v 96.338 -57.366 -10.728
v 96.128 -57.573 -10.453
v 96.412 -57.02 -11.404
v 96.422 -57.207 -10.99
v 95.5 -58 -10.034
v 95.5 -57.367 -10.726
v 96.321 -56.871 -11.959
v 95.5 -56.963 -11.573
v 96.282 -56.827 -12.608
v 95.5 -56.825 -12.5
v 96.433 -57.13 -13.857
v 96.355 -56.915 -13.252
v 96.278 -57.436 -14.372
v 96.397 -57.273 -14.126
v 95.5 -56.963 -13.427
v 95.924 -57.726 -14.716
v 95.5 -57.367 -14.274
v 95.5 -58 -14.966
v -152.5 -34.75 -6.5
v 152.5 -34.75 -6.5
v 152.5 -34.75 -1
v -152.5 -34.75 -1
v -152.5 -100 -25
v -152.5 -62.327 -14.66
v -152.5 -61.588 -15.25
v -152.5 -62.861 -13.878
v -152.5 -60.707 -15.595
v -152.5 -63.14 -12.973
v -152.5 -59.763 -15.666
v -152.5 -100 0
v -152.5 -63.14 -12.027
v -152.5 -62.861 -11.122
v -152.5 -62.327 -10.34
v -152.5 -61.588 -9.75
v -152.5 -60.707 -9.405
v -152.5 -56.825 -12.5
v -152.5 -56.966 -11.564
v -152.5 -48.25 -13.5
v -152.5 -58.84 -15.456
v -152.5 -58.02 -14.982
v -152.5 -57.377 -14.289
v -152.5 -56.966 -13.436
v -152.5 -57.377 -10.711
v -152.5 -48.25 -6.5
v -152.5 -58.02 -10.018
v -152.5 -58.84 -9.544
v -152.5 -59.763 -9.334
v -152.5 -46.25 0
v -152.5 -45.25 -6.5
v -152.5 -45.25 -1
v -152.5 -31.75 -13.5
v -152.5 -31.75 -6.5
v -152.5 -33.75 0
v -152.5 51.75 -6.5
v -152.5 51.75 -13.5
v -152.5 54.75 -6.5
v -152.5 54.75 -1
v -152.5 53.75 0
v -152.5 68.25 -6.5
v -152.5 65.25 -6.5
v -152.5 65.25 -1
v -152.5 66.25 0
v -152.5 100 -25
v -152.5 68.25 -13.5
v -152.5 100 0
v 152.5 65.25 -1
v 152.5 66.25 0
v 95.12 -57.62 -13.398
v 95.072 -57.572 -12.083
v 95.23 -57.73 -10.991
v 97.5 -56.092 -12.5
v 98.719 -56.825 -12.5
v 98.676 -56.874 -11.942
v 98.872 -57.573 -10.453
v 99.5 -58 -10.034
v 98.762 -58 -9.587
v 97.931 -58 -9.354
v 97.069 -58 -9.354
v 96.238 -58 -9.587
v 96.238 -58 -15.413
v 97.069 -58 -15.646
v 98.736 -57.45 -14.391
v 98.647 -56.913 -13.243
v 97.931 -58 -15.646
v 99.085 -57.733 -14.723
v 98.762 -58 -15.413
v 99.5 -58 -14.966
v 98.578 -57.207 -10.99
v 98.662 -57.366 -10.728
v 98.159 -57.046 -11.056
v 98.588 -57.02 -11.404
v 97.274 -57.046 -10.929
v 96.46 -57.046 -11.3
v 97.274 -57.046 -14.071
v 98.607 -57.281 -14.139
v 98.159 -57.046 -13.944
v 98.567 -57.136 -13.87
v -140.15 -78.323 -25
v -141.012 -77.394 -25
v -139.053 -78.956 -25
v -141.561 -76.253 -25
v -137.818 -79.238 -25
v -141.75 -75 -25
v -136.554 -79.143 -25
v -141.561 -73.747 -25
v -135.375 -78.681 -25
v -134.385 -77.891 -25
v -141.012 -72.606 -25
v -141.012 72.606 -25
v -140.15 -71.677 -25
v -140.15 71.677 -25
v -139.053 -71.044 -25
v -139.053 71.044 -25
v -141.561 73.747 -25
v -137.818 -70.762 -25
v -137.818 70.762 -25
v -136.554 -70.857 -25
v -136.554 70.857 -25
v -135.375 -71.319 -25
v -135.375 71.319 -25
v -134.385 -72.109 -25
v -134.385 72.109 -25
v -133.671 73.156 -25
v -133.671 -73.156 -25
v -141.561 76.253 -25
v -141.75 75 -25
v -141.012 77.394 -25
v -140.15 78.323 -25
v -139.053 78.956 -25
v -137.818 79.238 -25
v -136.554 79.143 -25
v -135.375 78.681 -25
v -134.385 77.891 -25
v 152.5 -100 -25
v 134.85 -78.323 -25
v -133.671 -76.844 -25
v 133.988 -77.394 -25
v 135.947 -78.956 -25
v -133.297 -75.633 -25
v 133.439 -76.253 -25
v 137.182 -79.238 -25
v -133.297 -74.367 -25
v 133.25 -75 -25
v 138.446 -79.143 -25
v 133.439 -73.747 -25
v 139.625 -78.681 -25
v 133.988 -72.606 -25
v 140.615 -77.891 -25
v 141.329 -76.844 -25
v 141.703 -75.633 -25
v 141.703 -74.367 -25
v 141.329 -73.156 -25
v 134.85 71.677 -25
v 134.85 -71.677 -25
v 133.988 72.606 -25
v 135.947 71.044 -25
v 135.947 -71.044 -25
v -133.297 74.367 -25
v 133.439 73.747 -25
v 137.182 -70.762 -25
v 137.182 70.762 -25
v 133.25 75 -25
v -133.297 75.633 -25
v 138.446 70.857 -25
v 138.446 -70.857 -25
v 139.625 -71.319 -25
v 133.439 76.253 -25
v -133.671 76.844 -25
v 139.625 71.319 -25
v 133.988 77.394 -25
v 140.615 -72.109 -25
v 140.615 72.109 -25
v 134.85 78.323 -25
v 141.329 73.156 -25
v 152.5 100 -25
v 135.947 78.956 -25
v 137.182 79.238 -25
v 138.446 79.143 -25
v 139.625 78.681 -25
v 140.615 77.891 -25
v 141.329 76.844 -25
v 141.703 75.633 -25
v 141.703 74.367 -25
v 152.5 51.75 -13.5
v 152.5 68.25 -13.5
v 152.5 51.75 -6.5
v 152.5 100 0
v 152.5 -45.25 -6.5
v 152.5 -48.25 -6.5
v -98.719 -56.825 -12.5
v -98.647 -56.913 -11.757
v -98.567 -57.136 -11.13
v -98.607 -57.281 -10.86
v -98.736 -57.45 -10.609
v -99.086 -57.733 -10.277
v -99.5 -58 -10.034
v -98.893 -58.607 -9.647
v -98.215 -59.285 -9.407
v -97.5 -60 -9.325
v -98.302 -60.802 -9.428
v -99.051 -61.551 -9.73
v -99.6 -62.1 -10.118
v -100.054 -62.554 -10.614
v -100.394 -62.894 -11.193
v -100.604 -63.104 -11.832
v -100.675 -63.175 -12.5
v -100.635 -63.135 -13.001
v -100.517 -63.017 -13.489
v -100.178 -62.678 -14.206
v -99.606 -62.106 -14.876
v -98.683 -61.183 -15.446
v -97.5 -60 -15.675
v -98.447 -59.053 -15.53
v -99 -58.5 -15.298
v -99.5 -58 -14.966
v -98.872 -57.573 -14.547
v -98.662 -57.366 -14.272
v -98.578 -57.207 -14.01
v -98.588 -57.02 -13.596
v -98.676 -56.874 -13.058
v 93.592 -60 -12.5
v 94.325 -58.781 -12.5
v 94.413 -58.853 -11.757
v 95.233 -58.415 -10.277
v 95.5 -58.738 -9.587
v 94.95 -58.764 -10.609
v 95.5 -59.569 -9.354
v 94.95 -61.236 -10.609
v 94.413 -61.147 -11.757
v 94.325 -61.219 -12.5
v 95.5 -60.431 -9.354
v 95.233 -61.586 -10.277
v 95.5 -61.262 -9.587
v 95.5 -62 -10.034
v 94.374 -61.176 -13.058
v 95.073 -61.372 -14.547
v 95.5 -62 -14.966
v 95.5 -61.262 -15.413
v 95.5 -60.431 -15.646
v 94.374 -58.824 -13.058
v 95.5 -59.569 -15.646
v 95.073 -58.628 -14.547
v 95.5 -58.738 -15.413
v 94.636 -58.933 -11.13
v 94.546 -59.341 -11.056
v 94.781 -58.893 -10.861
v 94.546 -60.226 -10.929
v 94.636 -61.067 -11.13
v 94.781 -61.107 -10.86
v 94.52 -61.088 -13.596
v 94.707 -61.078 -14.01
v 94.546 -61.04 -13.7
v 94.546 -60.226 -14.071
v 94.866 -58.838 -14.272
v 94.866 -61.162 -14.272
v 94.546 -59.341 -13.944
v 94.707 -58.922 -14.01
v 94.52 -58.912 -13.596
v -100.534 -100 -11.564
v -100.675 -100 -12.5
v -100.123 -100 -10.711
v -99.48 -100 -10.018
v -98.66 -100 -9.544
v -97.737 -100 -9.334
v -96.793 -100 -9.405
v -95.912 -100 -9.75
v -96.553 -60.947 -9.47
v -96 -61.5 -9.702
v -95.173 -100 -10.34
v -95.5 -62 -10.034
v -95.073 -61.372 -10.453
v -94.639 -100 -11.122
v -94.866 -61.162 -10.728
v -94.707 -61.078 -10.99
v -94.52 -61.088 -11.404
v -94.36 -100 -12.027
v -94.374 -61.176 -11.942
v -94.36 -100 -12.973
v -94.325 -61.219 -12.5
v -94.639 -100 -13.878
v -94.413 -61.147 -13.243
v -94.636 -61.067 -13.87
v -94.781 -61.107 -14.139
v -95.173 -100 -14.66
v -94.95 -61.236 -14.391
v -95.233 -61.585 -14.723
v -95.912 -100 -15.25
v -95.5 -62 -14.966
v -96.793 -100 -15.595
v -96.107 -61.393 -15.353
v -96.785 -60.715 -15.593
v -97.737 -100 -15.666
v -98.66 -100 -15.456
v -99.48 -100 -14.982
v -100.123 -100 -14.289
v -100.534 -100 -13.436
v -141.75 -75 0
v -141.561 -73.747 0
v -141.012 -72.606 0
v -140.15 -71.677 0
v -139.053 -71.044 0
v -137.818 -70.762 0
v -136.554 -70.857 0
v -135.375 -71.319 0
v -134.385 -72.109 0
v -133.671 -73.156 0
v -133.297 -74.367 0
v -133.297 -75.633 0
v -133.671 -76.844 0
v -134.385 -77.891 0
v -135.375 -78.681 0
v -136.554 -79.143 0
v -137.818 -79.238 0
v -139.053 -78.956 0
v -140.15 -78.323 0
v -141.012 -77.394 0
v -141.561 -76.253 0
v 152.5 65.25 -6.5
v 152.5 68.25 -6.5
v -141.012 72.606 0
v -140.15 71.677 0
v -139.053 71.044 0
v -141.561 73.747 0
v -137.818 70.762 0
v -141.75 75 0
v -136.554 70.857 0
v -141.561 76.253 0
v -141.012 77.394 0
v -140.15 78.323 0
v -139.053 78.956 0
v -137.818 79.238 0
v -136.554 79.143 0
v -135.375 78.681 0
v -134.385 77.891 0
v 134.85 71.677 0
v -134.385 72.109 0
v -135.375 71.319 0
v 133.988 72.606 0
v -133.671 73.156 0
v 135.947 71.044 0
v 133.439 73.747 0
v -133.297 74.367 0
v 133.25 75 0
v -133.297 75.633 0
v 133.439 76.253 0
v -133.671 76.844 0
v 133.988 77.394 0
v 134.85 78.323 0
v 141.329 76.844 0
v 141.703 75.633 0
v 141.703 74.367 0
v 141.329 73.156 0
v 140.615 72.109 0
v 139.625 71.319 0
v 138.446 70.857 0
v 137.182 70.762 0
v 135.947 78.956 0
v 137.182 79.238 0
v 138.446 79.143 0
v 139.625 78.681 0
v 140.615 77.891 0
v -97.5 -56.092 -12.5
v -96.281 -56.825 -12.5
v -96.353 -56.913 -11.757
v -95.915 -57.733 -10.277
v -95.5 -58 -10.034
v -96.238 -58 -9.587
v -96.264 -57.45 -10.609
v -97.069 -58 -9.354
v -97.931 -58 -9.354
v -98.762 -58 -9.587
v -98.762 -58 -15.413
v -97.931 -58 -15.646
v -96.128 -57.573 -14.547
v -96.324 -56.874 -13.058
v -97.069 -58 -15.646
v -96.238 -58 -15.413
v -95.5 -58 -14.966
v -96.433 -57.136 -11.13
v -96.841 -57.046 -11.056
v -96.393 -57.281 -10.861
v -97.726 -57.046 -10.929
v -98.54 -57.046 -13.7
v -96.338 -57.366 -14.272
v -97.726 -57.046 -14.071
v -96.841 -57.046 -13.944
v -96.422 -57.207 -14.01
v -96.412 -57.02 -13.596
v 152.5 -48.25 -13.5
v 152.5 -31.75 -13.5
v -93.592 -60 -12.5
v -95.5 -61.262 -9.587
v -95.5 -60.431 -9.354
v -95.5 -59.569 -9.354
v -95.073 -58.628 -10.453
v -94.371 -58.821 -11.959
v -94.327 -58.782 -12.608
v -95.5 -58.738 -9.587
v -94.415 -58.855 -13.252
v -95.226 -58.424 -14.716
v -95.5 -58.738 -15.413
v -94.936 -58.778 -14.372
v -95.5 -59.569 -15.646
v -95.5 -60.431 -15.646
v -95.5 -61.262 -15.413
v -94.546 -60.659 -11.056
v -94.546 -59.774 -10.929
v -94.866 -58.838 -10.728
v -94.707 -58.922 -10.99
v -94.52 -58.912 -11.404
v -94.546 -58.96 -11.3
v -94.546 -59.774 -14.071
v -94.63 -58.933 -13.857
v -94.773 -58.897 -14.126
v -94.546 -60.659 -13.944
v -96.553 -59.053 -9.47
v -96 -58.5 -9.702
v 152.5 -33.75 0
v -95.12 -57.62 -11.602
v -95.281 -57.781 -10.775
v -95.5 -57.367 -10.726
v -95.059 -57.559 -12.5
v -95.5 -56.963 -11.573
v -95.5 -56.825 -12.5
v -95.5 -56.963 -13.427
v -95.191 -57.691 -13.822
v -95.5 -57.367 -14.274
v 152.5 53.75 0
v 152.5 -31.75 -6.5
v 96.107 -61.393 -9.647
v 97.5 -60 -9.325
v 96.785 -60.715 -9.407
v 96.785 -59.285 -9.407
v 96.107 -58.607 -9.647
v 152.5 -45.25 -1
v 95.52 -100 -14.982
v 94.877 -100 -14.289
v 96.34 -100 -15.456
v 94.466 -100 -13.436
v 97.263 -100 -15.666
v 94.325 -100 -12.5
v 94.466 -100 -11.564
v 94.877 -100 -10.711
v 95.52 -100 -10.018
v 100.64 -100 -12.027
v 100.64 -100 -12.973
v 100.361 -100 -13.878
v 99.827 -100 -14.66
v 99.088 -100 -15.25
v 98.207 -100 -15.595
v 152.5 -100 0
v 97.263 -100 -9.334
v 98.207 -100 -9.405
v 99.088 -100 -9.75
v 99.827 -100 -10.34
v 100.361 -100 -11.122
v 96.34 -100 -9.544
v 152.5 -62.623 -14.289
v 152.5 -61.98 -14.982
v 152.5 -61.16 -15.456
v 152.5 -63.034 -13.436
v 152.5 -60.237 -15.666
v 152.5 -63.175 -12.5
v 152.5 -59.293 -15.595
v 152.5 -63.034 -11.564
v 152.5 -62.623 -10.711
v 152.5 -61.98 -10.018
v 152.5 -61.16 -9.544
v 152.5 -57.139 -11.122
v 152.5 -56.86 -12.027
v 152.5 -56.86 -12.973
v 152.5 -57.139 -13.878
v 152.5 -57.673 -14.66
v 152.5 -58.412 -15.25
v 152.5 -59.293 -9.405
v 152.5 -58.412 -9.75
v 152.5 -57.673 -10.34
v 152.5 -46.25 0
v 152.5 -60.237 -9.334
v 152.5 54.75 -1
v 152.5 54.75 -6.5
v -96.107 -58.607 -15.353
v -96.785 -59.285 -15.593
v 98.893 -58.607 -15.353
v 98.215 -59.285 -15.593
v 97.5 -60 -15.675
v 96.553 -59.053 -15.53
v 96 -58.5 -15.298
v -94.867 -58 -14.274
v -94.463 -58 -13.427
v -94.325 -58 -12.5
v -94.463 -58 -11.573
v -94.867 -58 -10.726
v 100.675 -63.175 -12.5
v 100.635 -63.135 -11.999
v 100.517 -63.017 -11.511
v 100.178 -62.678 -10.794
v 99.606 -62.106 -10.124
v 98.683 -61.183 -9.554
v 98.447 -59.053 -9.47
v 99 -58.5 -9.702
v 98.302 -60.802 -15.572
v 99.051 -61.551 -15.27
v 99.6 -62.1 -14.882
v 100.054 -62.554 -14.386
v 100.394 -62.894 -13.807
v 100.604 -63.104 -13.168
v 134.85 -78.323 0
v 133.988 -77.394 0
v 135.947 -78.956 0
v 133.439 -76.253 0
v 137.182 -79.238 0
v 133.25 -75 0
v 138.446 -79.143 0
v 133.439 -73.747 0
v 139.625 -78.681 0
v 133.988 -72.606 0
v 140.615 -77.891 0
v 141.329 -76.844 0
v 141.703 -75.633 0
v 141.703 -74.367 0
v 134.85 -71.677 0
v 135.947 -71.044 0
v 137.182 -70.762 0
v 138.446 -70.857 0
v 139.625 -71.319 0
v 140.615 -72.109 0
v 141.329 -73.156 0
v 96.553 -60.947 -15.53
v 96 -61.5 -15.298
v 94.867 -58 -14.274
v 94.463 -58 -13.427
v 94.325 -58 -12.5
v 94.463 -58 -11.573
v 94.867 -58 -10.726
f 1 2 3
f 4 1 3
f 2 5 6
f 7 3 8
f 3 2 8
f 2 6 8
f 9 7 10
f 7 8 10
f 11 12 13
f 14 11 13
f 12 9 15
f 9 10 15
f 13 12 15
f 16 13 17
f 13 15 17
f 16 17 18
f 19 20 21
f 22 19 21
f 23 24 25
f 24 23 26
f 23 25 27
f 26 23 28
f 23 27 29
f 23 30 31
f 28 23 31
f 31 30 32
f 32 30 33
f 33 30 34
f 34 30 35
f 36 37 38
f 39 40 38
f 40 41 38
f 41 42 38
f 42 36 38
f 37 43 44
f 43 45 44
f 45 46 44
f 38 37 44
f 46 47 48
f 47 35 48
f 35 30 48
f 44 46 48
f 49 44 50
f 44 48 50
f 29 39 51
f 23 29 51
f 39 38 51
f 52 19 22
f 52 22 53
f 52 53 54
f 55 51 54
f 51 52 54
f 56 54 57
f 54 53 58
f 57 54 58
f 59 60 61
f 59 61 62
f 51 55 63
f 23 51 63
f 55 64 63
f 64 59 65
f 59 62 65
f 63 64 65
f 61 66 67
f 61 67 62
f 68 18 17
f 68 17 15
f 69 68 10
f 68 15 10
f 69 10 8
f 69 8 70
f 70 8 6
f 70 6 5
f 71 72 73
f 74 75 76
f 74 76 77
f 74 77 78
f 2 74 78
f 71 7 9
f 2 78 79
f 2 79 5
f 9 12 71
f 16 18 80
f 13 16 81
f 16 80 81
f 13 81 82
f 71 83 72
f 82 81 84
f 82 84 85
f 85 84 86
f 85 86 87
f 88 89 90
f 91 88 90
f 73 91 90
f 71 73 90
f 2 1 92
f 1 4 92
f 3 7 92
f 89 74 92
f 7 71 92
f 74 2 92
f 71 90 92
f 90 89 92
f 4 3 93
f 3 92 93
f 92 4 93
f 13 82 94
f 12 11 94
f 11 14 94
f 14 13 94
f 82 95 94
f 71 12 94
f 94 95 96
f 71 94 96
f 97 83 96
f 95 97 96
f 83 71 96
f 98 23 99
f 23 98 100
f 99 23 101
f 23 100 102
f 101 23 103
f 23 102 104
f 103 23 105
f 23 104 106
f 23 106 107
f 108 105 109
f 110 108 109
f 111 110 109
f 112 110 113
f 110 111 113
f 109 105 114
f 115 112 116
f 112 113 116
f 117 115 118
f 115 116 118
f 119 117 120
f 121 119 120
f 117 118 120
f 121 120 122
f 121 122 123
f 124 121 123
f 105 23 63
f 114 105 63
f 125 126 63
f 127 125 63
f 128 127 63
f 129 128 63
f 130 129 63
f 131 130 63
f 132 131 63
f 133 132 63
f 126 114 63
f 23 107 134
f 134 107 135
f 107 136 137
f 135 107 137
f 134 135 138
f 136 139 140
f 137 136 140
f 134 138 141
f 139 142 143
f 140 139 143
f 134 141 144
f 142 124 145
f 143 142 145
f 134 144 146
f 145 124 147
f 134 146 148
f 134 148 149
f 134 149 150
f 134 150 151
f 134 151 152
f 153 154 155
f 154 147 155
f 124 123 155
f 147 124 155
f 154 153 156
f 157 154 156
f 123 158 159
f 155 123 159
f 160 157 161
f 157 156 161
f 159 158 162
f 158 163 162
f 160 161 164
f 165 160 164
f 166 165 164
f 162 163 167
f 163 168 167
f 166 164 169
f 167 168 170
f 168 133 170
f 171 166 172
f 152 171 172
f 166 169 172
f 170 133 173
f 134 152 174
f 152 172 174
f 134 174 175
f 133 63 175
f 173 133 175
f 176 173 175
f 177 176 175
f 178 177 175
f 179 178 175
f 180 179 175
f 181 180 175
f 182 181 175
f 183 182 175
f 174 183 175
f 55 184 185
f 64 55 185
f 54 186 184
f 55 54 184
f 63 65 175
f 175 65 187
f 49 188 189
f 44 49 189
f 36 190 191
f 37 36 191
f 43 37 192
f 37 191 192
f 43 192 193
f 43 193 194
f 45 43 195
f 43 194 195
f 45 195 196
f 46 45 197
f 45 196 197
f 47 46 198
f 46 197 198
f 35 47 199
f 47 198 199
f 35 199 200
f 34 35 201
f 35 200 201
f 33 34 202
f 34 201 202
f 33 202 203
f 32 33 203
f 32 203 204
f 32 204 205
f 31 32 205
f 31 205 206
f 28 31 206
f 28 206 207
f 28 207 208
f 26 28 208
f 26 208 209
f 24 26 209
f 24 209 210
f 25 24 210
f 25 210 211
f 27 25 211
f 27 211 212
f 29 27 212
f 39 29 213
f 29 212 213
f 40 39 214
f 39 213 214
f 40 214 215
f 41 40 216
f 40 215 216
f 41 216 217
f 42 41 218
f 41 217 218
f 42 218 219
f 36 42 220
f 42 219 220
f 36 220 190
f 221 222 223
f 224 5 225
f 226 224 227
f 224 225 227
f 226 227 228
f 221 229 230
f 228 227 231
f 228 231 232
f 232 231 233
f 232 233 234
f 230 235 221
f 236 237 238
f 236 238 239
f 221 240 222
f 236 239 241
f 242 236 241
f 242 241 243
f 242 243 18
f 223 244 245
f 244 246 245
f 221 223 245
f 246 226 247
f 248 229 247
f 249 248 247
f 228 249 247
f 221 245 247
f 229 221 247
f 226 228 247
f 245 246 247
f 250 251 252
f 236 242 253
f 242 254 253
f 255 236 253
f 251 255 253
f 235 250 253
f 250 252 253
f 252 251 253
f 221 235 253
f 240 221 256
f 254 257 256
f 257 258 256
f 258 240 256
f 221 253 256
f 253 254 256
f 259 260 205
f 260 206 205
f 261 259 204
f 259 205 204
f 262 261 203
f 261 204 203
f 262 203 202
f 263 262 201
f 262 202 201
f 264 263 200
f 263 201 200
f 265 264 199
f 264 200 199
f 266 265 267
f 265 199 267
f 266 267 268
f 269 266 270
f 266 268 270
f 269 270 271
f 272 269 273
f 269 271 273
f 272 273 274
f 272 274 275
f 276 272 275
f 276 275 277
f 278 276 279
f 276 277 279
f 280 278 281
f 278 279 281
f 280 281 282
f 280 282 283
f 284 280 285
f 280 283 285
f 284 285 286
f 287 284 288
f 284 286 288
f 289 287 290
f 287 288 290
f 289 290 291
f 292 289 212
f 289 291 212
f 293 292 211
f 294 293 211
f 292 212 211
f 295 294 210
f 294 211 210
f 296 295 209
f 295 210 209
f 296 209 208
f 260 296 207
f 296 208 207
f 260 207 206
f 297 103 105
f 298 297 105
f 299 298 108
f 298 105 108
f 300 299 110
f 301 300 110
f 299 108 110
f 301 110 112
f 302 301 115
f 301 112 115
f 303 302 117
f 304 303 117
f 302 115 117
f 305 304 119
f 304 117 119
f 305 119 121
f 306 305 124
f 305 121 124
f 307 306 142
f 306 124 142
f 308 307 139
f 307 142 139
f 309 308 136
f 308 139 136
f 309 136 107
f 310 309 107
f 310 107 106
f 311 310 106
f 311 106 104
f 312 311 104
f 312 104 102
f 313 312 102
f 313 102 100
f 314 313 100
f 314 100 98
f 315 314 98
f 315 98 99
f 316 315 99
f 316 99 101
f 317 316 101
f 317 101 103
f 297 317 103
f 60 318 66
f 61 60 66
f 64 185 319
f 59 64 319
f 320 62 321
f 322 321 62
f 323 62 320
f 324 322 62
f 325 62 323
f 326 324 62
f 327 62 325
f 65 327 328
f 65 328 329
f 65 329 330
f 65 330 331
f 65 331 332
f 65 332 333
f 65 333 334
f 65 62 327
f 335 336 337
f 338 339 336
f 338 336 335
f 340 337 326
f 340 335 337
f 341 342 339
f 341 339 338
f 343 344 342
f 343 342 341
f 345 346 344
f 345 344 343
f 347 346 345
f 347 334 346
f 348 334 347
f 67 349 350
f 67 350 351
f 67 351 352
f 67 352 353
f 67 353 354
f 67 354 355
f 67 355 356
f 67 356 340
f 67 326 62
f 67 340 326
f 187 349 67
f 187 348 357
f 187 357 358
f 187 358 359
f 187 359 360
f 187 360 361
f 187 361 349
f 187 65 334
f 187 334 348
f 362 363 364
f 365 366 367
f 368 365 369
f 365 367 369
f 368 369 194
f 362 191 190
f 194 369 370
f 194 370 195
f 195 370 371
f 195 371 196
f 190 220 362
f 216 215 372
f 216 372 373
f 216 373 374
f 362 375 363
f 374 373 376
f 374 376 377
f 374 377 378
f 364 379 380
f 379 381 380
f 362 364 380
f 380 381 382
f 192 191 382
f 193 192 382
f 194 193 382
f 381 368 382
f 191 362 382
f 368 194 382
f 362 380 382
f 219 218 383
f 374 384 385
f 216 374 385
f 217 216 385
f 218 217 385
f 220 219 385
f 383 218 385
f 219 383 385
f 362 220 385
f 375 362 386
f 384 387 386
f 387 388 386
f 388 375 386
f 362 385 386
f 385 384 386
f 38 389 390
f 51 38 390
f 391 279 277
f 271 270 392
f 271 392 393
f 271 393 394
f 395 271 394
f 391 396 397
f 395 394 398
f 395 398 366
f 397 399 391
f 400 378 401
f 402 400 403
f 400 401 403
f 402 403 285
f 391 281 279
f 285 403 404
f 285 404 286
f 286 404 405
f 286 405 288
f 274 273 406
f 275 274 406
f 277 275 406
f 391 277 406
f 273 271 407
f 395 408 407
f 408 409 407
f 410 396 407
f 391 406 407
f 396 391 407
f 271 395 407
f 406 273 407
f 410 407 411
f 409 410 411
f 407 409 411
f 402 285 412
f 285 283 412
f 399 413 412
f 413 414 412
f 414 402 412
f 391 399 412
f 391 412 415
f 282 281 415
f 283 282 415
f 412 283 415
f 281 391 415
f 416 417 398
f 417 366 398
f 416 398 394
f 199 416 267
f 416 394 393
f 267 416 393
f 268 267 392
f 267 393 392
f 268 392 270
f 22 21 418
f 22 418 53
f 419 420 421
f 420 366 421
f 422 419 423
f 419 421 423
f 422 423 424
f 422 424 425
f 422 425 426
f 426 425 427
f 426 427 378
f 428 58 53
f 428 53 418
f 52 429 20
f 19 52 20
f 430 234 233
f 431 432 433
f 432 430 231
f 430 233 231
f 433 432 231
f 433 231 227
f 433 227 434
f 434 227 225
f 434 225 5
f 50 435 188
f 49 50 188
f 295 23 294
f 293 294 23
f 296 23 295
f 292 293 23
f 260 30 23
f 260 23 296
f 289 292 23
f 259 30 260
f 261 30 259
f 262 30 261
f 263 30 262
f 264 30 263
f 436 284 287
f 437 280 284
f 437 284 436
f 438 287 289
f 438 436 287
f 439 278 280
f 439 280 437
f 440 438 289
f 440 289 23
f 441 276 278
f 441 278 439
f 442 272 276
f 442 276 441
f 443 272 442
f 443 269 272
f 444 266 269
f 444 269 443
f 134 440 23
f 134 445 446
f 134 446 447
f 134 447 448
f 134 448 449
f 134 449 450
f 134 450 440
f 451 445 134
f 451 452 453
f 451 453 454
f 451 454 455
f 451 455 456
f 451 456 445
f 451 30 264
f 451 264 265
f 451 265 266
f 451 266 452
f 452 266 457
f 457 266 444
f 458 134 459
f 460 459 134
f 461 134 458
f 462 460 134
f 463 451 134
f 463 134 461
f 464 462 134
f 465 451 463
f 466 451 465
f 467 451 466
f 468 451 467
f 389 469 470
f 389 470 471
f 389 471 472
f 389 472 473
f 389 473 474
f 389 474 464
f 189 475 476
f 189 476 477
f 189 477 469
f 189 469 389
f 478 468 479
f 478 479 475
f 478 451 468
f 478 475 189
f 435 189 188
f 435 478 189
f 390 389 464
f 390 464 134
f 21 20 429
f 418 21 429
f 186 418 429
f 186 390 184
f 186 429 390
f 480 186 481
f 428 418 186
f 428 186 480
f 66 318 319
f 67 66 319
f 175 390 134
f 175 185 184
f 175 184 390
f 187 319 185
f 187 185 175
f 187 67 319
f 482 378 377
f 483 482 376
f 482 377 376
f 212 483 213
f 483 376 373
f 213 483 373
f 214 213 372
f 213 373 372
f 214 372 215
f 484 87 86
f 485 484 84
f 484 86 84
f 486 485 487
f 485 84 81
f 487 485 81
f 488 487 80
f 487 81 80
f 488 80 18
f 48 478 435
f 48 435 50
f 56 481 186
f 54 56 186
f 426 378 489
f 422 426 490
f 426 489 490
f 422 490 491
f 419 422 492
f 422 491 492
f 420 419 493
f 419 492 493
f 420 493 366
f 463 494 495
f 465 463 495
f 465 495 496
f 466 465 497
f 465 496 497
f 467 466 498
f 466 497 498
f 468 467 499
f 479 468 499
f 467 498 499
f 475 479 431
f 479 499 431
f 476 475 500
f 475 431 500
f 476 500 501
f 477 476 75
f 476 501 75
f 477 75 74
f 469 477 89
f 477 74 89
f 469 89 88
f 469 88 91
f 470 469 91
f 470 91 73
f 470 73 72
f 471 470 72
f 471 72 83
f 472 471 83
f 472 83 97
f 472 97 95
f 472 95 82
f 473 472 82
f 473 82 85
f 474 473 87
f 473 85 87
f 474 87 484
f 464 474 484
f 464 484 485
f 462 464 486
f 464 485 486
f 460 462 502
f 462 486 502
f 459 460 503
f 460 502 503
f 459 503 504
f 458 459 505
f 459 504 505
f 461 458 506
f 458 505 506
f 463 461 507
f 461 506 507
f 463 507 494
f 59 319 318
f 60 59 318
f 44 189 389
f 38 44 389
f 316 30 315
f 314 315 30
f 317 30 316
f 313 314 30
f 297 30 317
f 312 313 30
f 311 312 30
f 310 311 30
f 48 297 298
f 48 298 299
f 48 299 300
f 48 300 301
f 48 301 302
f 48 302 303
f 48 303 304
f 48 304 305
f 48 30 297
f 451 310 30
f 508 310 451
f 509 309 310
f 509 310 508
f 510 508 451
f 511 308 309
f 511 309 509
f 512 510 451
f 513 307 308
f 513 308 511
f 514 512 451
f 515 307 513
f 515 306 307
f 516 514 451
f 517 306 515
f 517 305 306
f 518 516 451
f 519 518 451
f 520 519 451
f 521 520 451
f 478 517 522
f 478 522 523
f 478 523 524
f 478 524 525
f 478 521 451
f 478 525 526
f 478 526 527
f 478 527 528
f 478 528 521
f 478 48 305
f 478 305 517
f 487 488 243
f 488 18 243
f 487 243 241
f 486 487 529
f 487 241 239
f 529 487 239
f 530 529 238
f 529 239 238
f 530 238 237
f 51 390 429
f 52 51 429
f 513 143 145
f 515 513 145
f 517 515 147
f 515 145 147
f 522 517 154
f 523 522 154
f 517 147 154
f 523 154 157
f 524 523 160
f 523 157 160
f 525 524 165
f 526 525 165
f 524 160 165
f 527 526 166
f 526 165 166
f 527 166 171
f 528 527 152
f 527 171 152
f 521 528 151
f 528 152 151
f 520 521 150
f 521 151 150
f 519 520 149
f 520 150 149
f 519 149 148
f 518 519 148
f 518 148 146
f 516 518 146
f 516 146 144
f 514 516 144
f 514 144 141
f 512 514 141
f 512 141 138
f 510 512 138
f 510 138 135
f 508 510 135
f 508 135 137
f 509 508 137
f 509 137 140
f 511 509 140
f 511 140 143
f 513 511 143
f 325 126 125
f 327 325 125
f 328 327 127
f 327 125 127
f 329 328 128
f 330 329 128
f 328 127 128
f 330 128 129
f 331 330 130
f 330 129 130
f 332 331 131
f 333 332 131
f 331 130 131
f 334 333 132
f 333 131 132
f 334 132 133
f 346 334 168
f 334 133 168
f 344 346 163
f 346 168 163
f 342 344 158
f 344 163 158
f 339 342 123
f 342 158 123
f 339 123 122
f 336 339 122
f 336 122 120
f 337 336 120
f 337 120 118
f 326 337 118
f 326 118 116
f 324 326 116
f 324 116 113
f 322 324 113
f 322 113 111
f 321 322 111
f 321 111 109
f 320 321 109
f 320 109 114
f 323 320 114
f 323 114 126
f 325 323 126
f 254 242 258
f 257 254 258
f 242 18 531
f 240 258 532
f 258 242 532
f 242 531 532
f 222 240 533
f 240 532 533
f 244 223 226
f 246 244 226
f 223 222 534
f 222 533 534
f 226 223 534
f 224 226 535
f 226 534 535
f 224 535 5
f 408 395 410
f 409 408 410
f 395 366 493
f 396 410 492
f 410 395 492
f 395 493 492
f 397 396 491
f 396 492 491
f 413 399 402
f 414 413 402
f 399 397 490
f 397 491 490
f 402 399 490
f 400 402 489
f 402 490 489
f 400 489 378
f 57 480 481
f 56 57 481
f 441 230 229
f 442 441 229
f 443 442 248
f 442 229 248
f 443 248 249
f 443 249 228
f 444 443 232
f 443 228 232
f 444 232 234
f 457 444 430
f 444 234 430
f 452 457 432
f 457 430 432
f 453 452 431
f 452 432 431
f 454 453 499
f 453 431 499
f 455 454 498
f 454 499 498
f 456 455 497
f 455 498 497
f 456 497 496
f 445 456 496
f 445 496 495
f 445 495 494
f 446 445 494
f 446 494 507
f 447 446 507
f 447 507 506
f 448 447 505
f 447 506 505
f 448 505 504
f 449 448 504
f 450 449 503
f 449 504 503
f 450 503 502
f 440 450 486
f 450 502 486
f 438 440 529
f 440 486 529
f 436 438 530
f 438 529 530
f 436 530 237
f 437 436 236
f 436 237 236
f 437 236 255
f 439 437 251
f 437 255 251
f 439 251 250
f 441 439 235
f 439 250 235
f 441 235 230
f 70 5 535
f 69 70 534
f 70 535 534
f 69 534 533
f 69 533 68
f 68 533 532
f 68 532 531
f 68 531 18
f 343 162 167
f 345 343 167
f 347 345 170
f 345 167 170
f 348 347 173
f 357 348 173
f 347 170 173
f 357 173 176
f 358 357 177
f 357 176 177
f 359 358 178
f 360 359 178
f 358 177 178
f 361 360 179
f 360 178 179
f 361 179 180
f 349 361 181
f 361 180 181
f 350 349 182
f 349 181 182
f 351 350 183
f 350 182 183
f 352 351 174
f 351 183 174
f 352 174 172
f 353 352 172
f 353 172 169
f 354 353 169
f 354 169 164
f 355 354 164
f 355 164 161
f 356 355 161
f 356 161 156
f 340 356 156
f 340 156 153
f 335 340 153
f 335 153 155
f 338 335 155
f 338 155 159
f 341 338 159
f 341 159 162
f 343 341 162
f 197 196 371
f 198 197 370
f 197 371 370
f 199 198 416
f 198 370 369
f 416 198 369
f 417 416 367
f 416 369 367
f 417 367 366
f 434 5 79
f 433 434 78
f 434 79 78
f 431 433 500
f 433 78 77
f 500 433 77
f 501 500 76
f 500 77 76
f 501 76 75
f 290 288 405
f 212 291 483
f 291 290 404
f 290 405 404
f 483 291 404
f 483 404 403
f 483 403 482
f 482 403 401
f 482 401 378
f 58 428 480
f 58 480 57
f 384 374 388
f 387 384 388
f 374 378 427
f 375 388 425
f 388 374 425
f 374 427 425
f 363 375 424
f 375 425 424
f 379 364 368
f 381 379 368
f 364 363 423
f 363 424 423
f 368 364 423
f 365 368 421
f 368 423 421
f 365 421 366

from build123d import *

# Parameters (mm, degrees)
F0_W            = 305
F0_H            = 200
F1_DEPTH        = 25
F3_D            = 8.5
F5_DEPTH        = 152.501
F5_DEPTH_BACK   = 152.501
F6_SIZE         = 1
F10_D           = 6.35
F10_DEPTH       = 42
F10_TIP         = 1.9077324654
F11_D           = 6.35
F11_DEPTH       = 57
F11_TIP         = 1.9077324654
F11_ON_F8_D     = 6.35
F11_ON_F8_DEPTH = 57
F11_ON_F8_TIP   = 1.9077324654


with BuildPart() as f1:
    # F0 (on Top) → F1 (new body)
    with BuildSketch(Plane.XY):
        Rectangle(F0_W, F0_H)
    extrude(amount=-F1_DEPTH)

    # F3 (through all)
    with Locations(Plane.XY):
        with Locations((-137.5, 75), (137.5, 75), (137.5, -75), (-137.5, -75)):
            Hole(F3_D / 2)

    # F4 (on Right) → F5 (cut, two sides)
    with BuildSketch(Plane.YZ) as f5_sk:
        Polygon((-34.75, 0), (-40, 0), (-45.25, 0), (-45.25, -6.5), (-48.25, -6.5), (-48.25, -13.5), (-40, -13.5), (-31.75, -13.5), (-31.75, -6.5), (-34.75, -6.5), align=None)
        Polygon((65.25, 0), (60, 0), (54.75, 0), (54.75, -6.5), (51.75, -6.5), (51.75, -13.5), (60, -13.5), (68.25, -13.5), (68.25, -6.5), (65.25, -6.5), align=None)
    extrude(amount=-F5_DEPTH, mode=Mode.SUBTRACT)
    extrude(f5_sk.sketch, amount=F5_DEPTH_BACK, mode=Mode.SUBTRACT)

    # F6
    f6_edges = [f1.edges().sort_by_distance(p)[0] for p in [
        (0, -34.75, 0),
        (0, -45.25, 0),
        (0, 65.25, 0),
        (0, 54.75, 0),
    ]]
    chamfer(f6_edges, length=F6_SIZE)

    # F10
    with Locations(Plane.XZ.offset(100)):
        with Locations((97.5, -12.5), (-97.5, -12.5)):
            Hole(F10_D / 2, depth=F10_DEPTH)
            with Locations((0, 0, -(F10_DEPTH + F10_TIP / 2))):  # 118° drill point
                Cone(0, F10_D / 2, F10_TIP, mode=Mode.SUBTRACT)

    # F11
    with Locations(Plane(origin=(-152.5, 0, 0), x_dir=(0, -1, 0), z_dir=(-1, 0, 0))):
        with Locations((60, -12.5)):
            Hole(F11_D / 2, depth=F11_DEPTH)
            with Locations((0, 0, -(F11_DEPTH + F11_TIP / 2))):  # 118° drill point
                Cone(0, F11_D / 2, F11_TIP, mode=Mode.SUBTRACT)

    # F11 on F8
    with Locations(Plane.YZ.offset(152.5)):
        with Locations((-60, -12.5)):
            Hole(F11_ON_F8_D / 2, depth=F11_ON_F8_DEPTH)
            with Locations((0, 0, -(F11_ON_F8_DEPTH + F11_ON_F8_TIP / 2))):  # 118° drill point
                Cone(0, F11_ON_F8_D / 2, F11_ON_F8_TIP, mode=Mode.SUBTRACT)


solid = f1.part
